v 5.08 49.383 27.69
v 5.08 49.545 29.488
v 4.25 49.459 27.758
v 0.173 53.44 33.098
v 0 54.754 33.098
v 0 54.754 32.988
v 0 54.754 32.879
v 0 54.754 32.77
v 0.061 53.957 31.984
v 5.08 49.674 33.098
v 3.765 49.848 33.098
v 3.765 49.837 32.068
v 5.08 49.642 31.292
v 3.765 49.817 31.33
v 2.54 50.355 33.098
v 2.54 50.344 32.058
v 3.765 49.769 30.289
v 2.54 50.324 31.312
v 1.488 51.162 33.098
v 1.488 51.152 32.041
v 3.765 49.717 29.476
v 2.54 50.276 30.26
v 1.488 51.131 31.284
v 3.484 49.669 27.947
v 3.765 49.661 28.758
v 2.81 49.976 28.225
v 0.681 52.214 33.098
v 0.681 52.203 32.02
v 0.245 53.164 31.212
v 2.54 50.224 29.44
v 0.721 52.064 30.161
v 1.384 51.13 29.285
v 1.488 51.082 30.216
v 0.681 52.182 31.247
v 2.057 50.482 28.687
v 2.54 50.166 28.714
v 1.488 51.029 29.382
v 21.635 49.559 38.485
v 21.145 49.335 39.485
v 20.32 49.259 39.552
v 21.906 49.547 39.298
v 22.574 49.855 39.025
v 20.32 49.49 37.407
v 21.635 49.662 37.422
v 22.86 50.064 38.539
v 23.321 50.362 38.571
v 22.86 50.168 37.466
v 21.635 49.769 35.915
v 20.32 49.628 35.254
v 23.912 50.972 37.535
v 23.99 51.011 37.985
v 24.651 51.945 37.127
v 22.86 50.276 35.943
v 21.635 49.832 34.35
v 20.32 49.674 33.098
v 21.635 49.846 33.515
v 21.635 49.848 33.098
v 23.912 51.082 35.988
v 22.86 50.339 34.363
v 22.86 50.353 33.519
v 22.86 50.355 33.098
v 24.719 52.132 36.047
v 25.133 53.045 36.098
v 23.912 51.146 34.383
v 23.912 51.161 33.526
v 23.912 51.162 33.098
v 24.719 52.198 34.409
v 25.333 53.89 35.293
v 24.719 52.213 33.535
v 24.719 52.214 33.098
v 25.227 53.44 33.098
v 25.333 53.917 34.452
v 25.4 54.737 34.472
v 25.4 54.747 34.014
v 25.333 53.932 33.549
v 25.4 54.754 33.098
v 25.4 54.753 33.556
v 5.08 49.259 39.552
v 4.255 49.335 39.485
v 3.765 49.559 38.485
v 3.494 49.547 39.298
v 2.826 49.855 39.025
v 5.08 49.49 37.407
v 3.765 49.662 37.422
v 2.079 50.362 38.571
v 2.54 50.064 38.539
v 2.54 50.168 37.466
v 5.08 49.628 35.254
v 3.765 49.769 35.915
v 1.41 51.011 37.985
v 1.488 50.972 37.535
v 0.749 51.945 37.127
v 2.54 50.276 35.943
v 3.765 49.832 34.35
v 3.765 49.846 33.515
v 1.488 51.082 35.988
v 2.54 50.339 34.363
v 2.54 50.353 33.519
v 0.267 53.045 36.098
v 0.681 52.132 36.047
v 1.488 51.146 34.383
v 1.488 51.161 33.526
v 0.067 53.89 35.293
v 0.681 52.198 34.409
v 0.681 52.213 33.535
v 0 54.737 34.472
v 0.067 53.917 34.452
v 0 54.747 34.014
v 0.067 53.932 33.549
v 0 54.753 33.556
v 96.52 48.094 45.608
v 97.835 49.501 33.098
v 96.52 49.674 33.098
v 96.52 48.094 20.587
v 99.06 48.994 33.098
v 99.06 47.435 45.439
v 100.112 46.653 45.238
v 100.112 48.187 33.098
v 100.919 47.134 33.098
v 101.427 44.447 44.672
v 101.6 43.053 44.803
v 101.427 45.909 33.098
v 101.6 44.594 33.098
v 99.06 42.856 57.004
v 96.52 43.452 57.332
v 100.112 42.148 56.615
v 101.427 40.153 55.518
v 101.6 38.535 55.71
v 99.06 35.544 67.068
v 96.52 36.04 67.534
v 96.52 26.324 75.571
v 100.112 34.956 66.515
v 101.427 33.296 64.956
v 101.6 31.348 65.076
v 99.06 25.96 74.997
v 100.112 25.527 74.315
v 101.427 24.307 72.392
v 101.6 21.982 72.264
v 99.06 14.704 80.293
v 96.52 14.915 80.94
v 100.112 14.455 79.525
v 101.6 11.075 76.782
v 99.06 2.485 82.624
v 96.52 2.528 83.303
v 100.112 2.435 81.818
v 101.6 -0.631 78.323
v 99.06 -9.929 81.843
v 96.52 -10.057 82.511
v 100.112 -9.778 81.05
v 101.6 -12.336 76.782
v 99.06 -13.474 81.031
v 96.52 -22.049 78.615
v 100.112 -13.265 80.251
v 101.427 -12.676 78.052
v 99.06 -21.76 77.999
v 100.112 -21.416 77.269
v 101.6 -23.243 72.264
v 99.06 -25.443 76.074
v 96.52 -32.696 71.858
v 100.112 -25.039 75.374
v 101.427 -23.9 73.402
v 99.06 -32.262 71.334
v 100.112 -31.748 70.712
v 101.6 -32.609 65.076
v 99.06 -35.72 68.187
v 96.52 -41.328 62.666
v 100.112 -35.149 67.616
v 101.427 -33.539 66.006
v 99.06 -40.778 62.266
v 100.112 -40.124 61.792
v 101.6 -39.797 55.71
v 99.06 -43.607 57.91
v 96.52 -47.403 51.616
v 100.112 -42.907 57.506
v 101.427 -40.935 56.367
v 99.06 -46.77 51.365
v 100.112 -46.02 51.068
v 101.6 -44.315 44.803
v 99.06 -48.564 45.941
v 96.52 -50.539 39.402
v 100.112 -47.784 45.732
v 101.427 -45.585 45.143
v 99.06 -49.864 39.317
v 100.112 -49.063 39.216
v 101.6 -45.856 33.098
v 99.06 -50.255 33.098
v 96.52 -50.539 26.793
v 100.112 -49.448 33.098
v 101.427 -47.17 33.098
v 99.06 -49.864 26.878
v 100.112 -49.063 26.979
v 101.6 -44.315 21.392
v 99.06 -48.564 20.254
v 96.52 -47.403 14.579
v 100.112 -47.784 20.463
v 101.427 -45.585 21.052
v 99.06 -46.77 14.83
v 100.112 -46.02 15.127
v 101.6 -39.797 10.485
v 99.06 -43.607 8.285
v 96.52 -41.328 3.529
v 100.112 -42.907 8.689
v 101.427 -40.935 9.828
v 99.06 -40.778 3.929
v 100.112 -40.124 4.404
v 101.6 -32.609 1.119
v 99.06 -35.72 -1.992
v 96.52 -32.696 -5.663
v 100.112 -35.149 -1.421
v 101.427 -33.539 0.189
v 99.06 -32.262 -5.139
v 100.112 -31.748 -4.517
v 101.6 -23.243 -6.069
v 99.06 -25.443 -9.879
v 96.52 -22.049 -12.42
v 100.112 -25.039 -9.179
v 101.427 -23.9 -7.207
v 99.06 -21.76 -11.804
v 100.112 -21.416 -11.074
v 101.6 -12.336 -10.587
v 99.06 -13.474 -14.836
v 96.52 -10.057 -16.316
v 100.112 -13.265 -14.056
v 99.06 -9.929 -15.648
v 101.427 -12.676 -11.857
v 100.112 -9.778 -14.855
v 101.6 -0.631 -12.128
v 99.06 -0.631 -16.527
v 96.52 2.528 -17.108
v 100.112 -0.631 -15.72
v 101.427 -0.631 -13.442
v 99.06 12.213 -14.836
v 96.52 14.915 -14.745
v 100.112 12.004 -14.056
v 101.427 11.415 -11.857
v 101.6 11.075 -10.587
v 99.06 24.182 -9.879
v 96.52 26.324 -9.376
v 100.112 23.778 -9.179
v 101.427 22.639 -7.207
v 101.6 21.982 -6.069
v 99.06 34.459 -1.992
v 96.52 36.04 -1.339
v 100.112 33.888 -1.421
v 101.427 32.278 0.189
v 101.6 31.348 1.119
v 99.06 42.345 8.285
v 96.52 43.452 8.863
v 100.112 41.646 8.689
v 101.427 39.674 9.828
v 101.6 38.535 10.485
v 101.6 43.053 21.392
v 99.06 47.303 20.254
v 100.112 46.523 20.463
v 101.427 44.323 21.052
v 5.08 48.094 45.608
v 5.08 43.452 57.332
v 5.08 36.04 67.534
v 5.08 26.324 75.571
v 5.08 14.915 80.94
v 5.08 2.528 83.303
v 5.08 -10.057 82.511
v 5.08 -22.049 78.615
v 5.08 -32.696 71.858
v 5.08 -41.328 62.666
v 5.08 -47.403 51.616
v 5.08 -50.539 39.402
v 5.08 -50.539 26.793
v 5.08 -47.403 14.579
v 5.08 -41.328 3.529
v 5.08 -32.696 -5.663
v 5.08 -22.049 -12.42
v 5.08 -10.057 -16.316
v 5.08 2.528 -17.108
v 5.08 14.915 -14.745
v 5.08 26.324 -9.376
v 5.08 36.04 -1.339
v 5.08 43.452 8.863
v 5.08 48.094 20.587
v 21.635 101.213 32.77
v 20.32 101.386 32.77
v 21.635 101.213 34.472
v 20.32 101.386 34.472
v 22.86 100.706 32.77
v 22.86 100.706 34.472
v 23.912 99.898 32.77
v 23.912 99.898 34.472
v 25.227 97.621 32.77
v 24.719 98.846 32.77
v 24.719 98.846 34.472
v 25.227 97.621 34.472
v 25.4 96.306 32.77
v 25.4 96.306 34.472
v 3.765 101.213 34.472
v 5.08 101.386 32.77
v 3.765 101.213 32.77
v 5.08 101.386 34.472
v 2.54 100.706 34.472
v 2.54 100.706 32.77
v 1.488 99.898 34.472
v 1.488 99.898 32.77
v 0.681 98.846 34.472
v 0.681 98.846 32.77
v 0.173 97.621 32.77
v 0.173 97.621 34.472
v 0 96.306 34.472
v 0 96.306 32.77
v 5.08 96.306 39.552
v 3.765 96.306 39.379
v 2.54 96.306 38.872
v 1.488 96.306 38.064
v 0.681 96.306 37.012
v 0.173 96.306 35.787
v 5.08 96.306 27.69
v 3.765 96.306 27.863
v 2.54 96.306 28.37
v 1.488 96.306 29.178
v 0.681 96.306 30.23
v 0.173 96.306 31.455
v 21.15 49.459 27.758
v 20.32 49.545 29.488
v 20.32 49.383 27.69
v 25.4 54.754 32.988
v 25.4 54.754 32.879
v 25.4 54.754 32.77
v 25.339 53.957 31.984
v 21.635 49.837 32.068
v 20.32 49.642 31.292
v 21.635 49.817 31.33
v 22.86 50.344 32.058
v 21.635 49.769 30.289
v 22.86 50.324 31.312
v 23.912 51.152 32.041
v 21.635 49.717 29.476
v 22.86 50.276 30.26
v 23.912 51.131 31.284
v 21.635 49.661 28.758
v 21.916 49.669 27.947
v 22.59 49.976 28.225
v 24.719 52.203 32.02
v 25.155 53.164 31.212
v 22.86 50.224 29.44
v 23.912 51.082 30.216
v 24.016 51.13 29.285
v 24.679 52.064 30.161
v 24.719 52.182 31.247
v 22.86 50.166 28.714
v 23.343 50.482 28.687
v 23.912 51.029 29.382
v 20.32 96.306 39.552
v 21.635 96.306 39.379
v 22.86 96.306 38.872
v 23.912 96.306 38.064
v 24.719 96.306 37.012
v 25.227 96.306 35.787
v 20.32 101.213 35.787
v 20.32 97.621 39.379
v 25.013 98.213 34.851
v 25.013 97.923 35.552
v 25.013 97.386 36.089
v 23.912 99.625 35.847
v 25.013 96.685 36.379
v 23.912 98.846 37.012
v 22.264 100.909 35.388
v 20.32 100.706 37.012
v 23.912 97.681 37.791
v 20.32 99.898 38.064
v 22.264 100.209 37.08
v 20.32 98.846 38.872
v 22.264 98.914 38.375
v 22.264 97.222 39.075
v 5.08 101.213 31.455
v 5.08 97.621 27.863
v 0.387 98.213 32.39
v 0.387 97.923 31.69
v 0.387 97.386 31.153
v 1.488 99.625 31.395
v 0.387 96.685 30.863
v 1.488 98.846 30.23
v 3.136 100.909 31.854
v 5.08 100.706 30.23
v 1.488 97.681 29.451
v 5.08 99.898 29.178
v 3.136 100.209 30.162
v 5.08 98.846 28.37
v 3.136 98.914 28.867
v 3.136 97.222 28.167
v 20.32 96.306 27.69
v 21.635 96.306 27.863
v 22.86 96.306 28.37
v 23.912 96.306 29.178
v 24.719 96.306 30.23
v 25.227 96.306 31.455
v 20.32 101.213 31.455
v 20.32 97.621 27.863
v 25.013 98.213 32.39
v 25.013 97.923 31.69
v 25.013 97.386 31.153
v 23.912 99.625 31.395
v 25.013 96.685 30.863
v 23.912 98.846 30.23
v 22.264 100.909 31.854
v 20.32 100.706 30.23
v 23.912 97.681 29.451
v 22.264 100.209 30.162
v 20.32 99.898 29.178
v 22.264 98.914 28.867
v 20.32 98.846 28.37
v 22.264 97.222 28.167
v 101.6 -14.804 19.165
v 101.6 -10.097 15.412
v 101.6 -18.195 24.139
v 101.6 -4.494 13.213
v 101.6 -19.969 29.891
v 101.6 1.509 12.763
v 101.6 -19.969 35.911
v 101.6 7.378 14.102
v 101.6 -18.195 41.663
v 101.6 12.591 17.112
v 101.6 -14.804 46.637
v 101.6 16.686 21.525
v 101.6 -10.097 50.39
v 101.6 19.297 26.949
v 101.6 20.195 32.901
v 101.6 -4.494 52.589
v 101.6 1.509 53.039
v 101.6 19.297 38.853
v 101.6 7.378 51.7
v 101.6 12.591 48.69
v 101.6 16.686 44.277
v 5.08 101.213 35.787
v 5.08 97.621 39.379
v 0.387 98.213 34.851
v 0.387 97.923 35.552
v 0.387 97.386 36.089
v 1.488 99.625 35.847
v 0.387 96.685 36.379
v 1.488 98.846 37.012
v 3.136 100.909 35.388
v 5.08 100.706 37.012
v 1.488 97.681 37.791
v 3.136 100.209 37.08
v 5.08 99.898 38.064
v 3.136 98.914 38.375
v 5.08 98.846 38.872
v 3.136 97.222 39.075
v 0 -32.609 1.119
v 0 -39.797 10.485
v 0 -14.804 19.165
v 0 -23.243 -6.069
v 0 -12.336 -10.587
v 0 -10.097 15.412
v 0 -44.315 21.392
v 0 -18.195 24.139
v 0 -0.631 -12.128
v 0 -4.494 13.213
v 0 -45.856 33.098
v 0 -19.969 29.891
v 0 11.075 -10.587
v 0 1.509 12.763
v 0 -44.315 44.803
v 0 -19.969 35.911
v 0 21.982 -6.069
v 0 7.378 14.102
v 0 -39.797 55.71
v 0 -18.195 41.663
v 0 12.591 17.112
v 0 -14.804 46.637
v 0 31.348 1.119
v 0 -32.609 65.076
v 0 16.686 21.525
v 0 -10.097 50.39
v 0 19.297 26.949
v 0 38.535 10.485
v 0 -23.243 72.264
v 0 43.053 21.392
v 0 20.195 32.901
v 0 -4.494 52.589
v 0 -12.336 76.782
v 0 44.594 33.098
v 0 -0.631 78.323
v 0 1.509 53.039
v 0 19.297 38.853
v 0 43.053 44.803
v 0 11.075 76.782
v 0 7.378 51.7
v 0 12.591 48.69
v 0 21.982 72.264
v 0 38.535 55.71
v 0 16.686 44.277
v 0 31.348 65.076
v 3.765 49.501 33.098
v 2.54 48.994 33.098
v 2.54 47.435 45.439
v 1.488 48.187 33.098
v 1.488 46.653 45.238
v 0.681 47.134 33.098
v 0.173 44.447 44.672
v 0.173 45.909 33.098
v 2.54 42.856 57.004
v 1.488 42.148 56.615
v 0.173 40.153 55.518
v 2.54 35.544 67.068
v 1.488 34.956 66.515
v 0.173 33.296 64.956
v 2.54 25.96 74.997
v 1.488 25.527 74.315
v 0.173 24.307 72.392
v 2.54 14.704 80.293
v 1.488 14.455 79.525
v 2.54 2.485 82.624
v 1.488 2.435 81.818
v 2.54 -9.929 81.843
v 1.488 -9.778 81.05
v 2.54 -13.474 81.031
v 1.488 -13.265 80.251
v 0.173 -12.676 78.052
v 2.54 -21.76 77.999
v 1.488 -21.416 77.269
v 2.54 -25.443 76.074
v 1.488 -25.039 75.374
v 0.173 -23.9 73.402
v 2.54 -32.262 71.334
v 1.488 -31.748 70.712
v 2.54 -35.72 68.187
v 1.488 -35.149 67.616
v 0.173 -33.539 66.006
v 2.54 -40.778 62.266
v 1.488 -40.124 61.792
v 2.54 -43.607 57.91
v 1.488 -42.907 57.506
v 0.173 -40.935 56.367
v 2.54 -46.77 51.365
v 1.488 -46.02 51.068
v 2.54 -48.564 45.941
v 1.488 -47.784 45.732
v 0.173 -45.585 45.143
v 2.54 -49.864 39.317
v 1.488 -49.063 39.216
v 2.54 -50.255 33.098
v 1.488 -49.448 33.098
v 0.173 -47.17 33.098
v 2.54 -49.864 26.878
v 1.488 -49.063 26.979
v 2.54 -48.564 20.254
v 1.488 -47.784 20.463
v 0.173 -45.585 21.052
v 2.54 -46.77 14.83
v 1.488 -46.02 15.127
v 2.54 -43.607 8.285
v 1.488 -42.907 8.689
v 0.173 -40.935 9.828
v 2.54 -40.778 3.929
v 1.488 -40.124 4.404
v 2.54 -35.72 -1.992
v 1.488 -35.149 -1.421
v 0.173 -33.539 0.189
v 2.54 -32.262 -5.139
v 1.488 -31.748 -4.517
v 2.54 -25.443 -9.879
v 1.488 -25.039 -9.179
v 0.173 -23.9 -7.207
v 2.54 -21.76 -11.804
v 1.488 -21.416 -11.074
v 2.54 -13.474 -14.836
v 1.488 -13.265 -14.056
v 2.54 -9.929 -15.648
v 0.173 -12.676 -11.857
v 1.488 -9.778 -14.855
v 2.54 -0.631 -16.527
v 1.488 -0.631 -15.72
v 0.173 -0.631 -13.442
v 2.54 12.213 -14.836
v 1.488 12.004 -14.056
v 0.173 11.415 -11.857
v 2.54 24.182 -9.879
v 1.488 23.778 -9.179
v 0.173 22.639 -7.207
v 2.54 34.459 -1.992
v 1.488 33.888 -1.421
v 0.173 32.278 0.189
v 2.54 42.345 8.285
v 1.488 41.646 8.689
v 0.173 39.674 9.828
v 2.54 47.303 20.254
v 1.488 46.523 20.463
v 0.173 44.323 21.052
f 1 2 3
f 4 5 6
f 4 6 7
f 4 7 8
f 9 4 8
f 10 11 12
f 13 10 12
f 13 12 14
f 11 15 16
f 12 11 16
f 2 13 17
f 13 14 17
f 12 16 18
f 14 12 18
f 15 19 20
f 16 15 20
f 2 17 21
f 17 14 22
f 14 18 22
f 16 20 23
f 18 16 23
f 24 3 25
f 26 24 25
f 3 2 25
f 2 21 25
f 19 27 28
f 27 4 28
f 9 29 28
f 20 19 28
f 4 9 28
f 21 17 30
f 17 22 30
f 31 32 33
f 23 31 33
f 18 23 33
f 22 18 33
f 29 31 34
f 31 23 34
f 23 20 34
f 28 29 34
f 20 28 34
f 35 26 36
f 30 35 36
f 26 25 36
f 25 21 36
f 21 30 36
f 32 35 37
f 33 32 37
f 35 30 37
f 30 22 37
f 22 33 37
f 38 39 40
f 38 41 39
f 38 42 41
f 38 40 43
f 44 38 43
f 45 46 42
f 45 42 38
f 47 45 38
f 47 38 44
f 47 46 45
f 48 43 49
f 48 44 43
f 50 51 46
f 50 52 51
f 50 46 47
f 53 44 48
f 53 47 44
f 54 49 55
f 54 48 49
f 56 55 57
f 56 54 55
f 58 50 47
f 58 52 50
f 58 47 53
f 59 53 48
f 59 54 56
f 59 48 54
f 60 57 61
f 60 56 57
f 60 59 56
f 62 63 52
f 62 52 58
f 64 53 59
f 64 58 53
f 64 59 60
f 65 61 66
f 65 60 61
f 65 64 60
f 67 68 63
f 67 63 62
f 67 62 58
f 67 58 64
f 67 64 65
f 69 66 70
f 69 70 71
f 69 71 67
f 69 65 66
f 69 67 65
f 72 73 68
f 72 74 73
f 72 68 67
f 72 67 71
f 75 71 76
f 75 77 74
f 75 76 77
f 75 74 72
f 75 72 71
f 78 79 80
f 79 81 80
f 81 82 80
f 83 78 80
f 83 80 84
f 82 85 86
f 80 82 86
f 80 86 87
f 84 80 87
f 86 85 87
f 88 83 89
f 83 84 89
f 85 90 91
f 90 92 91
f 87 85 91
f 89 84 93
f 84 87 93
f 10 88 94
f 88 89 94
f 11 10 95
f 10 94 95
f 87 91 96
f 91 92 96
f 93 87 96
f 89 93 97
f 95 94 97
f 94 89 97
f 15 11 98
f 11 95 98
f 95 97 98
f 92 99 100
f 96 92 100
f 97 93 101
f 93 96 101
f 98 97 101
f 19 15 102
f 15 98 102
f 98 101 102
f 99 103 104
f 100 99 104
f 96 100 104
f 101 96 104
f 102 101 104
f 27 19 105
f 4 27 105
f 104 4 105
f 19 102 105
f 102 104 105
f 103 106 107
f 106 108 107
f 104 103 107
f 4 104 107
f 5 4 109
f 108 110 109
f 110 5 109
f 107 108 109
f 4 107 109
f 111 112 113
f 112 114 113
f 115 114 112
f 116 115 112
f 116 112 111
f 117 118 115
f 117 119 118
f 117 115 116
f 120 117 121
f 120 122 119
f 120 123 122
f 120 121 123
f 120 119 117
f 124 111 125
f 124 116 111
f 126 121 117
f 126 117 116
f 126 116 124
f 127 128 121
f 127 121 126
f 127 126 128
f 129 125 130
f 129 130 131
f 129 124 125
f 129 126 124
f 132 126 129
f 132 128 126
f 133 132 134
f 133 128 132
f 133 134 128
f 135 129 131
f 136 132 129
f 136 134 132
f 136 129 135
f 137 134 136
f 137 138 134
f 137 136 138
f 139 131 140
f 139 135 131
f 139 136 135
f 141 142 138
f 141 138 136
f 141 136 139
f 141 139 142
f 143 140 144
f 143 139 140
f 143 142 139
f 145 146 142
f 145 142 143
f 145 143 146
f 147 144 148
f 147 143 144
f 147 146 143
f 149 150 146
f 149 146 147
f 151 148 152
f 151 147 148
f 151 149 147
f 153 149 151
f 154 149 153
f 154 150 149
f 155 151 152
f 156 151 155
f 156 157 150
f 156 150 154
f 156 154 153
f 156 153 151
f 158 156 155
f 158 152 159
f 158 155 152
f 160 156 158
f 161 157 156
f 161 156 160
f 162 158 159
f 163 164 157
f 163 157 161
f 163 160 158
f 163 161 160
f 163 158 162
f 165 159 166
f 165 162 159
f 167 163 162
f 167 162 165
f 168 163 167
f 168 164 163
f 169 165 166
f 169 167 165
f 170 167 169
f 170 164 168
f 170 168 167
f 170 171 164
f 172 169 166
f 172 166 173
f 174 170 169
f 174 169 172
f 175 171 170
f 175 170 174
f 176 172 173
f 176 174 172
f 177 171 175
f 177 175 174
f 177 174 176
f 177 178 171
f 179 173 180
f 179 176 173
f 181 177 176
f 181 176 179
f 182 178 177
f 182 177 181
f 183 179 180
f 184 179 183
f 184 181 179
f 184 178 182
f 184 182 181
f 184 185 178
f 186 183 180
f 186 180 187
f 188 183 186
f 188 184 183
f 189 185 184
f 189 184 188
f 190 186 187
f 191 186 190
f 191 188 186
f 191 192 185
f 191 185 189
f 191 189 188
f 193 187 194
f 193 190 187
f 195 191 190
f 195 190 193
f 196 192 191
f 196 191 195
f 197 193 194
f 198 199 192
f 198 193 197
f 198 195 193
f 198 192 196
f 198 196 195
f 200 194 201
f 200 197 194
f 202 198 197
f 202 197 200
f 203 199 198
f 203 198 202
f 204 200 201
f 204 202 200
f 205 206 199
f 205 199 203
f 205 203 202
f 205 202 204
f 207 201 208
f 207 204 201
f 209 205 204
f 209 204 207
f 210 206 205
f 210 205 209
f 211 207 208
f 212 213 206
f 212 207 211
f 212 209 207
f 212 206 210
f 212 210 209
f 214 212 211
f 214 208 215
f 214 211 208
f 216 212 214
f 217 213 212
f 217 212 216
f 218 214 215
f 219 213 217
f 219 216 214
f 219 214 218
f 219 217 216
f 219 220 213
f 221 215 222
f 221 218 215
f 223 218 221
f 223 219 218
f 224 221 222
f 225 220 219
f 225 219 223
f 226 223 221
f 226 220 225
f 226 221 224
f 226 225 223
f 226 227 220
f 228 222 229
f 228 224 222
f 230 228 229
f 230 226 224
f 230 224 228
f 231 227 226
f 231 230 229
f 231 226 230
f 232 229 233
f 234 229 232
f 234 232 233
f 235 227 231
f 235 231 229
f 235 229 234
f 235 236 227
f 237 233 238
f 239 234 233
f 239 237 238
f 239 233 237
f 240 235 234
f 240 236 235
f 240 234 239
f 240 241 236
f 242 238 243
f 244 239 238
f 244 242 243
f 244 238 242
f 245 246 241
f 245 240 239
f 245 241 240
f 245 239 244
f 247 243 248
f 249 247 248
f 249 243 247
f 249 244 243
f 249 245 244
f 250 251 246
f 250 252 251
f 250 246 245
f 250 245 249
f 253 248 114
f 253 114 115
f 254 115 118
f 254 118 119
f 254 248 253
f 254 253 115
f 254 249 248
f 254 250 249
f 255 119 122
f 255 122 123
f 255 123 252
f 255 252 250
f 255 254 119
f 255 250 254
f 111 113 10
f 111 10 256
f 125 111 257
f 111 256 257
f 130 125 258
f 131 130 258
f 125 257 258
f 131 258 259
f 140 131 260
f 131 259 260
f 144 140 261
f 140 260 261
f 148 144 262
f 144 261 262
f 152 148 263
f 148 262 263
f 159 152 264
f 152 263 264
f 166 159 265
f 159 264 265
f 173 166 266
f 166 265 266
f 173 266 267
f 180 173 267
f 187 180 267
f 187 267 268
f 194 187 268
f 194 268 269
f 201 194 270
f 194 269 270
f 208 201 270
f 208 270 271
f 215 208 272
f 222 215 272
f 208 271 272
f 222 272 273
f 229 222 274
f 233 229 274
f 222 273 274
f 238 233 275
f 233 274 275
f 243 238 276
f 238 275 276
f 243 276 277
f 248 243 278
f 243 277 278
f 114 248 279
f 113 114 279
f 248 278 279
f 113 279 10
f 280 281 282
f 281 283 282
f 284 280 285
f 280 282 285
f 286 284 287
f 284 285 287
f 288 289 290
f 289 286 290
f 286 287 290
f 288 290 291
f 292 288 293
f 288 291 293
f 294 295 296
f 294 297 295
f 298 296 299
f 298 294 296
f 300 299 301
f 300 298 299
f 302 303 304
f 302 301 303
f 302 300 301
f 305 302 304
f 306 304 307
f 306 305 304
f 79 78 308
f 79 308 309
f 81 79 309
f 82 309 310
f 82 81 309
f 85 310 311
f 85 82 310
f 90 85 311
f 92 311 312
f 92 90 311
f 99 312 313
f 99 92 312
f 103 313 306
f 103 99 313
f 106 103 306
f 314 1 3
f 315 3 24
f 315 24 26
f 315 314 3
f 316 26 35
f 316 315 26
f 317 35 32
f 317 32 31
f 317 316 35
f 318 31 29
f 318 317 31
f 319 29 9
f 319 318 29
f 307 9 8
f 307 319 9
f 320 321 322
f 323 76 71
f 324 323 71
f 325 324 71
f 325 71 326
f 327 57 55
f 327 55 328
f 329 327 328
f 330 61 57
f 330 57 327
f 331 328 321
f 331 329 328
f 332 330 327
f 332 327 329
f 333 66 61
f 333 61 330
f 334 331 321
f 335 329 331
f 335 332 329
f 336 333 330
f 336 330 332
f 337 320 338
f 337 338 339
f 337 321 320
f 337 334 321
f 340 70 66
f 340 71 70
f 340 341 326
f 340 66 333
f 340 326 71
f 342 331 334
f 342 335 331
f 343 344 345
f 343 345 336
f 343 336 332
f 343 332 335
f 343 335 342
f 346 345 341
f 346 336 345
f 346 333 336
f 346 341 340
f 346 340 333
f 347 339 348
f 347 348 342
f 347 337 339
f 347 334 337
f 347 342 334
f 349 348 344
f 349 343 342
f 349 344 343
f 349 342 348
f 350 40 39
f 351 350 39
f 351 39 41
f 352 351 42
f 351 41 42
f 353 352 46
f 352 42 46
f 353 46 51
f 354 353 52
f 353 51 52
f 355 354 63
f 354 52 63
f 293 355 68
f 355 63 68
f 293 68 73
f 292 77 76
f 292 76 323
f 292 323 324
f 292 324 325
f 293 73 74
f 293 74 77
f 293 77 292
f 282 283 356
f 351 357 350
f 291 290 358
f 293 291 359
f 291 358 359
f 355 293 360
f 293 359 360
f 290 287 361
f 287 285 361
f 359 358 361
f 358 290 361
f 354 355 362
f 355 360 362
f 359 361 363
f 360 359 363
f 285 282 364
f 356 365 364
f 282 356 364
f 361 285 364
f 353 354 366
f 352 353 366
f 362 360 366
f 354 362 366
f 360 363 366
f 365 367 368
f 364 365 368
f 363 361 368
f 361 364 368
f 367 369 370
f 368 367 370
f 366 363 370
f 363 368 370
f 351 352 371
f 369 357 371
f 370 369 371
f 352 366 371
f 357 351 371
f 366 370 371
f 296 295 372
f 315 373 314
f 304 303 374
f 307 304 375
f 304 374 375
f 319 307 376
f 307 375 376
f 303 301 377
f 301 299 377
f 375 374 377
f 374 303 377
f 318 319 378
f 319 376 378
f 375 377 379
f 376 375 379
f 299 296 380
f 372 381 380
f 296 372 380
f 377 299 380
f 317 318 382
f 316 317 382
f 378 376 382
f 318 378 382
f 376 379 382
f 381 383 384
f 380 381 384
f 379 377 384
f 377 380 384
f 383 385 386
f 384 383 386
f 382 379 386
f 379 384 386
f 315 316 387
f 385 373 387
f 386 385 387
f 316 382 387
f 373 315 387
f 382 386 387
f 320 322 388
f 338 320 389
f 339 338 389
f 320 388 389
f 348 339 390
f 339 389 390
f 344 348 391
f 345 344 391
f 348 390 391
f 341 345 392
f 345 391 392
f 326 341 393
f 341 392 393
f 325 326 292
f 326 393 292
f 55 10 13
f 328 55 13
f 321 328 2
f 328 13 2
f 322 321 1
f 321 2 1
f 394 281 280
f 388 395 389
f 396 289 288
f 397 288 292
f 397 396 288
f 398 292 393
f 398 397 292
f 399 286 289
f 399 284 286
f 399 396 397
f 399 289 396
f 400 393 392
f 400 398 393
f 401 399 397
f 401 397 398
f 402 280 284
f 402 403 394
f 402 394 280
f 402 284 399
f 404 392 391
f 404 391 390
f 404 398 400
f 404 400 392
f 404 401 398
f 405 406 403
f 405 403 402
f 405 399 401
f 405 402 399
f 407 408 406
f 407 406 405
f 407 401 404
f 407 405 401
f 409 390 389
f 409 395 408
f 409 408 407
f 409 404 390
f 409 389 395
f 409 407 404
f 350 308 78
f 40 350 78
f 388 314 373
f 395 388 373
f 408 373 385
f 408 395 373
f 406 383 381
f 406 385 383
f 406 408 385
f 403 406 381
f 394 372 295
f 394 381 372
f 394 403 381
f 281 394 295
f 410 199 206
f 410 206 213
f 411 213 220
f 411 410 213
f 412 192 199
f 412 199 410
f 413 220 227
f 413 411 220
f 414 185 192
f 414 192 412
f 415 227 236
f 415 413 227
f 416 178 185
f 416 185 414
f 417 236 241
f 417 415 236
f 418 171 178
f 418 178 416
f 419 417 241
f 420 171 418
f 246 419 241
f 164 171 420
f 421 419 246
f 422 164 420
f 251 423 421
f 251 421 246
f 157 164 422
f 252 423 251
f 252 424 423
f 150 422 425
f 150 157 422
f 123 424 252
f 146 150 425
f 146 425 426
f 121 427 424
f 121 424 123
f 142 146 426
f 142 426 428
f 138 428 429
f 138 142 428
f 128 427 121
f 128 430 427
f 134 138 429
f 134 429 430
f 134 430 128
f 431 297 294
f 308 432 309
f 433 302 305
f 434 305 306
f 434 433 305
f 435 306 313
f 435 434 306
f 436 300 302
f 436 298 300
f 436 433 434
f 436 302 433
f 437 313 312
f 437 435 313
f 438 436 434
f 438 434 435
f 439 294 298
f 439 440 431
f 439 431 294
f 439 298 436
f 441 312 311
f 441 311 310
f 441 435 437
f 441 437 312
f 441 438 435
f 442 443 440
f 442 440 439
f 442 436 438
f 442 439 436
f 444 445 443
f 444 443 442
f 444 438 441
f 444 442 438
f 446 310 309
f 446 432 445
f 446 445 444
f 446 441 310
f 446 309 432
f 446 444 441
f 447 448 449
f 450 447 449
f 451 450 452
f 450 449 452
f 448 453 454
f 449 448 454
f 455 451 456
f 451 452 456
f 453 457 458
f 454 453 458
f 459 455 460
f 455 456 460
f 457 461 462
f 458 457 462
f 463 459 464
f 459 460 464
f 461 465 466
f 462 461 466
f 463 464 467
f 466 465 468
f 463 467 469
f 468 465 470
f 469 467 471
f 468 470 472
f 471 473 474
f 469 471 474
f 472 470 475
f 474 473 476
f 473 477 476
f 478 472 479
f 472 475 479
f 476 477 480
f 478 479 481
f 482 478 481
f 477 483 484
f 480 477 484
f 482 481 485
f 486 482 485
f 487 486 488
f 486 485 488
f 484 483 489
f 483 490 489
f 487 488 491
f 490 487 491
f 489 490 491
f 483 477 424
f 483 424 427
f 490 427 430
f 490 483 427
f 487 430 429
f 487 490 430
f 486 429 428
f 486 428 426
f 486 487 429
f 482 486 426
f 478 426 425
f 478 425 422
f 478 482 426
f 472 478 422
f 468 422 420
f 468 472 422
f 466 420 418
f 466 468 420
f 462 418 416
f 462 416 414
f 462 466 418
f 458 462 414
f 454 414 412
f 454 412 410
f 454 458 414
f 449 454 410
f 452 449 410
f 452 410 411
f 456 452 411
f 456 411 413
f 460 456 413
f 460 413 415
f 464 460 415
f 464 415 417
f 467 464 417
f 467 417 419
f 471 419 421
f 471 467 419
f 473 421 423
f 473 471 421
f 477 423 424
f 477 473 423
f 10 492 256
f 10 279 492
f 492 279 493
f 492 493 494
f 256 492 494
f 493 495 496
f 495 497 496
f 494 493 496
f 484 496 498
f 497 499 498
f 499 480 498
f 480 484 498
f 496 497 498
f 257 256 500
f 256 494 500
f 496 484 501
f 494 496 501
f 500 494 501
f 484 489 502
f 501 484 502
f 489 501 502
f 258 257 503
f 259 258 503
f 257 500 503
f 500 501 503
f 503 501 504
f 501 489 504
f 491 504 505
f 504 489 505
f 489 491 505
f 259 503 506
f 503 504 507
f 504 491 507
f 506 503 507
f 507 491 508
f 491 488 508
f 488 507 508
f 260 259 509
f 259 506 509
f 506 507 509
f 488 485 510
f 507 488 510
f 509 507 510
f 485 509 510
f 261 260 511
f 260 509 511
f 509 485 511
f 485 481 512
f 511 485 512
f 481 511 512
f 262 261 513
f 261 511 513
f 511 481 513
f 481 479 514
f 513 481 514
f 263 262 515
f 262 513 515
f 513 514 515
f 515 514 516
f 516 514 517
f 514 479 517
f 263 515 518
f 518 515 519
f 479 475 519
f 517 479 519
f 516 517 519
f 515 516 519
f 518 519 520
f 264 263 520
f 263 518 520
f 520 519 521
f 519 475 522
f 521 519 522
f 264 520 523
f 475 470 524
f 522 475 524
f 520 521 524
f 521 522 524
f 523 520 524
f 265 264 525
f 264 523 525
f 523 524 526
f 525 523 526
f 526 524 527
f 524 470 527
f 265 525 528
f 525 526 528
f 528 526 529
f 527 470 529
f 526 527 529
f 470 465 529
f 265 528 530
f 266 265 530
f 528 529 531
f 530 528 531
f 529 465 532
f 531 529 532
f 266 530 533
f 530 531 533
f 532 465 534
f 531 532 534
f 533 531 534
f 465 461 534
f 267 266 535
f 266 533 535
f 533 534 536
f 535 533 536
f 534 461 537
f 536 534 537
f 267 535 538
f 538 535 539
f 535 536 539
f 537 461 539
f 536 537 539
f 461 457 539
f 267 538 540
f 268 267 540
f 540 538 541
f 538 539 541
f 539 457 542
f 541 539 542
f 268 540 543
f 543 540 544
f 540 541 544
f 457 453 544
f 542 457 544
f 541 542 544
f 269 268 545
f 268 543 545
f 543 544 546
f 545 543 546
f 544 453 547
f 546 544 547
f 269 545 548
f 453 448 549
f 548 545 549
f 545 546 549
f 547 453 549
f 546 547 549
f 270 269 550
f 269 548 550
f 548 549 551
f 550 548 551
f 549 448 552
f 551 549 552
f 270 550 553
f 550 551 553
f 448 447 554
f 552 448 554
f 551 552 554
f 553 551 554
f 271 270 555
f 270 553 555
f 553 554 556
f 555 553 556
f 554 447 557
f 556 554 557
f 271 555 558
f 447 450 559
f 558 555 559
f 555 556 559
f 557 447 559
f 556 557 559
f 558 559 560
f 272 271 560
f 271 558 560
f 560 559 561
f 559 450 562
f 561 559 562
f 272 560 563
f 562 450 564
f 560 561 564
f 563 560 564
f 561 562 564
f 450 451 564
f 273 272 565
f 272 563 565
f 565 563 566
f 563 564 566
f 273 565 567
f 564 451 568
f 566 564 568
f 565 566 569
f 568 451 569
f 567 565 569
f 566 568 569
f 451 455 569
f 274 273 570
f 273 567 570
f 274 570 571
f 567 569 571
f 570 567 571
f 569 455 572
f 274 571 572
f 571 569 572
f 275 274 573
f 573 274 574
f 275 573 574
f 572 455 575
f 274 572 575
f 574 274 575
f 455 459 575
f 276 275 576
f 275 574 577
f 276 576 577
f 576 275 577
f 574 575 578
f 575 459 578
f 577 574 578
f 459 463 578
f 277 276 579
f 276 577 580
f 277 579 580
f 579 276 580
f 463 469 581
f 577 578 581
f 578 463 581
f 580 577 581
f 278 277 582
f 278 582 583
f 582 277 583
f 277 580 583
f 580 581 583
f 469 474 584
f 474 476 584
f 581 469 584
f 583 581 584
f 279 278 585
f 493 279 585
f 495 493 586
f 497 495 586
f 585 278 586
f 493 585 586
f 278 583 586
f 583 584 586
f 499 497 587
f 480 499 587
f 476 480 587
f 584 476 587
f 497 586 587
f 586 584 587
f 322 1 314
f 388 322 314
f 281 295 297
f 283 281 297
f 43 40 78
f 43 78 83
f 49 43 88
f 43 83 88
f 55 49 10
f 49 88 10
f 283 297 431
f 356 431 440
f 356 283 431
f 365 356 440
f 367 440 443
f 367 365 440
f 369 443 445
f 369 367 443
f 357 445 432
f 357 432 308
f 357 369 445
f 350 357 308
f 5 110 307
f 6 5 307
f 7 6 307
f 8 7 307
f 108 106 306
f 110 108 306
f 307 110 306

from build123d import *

# Parameters (mm, degrees)
F0_R     = 50.3050224019
F0_R_2   = 20.1945759799
F1_DEPTH = 101.6
F3_DEPTH = 25.4
F4_R     = 5.08
F4_2_R   = 5.08


with BuildPart() as f1:
    # F0 (on Right) → F1 (new body)
    with BuildSketch(Plane.YZ):
        with Locations((-0.6305426359, 33.0975167453)):
            Circle(F0_R)
        with Locations((0, 32.9009890556)):
            Circle(F0_R_2, mode=Mode.SUBTRACT)
    extrude(amount=F1_DEPTH)

    # F4#2
    f4_2_edges = [f1.edges().sort_by_distance(p)[0] for p in [
        (0, -50.935565, 33.097517),
        (50.8, 49.67448, 33.097517),
        (101.6, -50.935565, 33.097517),
    ]]
    fillet(f4_2_edges, radius=F4_2_R)


with BuildPart() as f3:
    # F2 (on face) → F3 (new body)
    with BuildSketch(Plane.YZ):
        with BuildLine():
            ThreePointArc((49.6744797659, 33.0975167453), (49.6015460943, 30.3896503067), (49.3829565621, 27.6896357536))
            Line((49.3829565621, 27.6896357536), (101.3861596584, 27.6896357536))
            Line((101.3861596584, 27.6896357536), (101.3861596584, 39.5521745086))
            Line((101.3861596584, 39.5521745086), (49.2586613266, 39.5521745086))
            ThreePointArc((49.2586613266, 39.5521745086), (49.5704175232, 36.3315356002), (49.6744797659, 33.0975167453))
        make_face()
    extrude(amount=F3_DEPTH)

    # F4
    f4_edges = [f3.edges().sort_by_distance(p)[0] for p in [
        (12.7, 101.38616, 27.689636),
        (12.7, 101.38616, 39.552175),
        (0, 101.38616, 33.620905),
        (25.4, 101.38616, 33.620905),
        (25.4, 49.671719, 33.624582),
        (25.4, 75.384558, 27.689636),
        (25.4, 75.32241, 39.552175),
        (0, 49.671719, 33.624582),
        (0, 75.384558, 27.689636),
        (0, 75.32241, 39.552175),
    ]]
    fillet(f4_edges, radius=F4_R)


solid = Compound([f1.part, f3.part])
